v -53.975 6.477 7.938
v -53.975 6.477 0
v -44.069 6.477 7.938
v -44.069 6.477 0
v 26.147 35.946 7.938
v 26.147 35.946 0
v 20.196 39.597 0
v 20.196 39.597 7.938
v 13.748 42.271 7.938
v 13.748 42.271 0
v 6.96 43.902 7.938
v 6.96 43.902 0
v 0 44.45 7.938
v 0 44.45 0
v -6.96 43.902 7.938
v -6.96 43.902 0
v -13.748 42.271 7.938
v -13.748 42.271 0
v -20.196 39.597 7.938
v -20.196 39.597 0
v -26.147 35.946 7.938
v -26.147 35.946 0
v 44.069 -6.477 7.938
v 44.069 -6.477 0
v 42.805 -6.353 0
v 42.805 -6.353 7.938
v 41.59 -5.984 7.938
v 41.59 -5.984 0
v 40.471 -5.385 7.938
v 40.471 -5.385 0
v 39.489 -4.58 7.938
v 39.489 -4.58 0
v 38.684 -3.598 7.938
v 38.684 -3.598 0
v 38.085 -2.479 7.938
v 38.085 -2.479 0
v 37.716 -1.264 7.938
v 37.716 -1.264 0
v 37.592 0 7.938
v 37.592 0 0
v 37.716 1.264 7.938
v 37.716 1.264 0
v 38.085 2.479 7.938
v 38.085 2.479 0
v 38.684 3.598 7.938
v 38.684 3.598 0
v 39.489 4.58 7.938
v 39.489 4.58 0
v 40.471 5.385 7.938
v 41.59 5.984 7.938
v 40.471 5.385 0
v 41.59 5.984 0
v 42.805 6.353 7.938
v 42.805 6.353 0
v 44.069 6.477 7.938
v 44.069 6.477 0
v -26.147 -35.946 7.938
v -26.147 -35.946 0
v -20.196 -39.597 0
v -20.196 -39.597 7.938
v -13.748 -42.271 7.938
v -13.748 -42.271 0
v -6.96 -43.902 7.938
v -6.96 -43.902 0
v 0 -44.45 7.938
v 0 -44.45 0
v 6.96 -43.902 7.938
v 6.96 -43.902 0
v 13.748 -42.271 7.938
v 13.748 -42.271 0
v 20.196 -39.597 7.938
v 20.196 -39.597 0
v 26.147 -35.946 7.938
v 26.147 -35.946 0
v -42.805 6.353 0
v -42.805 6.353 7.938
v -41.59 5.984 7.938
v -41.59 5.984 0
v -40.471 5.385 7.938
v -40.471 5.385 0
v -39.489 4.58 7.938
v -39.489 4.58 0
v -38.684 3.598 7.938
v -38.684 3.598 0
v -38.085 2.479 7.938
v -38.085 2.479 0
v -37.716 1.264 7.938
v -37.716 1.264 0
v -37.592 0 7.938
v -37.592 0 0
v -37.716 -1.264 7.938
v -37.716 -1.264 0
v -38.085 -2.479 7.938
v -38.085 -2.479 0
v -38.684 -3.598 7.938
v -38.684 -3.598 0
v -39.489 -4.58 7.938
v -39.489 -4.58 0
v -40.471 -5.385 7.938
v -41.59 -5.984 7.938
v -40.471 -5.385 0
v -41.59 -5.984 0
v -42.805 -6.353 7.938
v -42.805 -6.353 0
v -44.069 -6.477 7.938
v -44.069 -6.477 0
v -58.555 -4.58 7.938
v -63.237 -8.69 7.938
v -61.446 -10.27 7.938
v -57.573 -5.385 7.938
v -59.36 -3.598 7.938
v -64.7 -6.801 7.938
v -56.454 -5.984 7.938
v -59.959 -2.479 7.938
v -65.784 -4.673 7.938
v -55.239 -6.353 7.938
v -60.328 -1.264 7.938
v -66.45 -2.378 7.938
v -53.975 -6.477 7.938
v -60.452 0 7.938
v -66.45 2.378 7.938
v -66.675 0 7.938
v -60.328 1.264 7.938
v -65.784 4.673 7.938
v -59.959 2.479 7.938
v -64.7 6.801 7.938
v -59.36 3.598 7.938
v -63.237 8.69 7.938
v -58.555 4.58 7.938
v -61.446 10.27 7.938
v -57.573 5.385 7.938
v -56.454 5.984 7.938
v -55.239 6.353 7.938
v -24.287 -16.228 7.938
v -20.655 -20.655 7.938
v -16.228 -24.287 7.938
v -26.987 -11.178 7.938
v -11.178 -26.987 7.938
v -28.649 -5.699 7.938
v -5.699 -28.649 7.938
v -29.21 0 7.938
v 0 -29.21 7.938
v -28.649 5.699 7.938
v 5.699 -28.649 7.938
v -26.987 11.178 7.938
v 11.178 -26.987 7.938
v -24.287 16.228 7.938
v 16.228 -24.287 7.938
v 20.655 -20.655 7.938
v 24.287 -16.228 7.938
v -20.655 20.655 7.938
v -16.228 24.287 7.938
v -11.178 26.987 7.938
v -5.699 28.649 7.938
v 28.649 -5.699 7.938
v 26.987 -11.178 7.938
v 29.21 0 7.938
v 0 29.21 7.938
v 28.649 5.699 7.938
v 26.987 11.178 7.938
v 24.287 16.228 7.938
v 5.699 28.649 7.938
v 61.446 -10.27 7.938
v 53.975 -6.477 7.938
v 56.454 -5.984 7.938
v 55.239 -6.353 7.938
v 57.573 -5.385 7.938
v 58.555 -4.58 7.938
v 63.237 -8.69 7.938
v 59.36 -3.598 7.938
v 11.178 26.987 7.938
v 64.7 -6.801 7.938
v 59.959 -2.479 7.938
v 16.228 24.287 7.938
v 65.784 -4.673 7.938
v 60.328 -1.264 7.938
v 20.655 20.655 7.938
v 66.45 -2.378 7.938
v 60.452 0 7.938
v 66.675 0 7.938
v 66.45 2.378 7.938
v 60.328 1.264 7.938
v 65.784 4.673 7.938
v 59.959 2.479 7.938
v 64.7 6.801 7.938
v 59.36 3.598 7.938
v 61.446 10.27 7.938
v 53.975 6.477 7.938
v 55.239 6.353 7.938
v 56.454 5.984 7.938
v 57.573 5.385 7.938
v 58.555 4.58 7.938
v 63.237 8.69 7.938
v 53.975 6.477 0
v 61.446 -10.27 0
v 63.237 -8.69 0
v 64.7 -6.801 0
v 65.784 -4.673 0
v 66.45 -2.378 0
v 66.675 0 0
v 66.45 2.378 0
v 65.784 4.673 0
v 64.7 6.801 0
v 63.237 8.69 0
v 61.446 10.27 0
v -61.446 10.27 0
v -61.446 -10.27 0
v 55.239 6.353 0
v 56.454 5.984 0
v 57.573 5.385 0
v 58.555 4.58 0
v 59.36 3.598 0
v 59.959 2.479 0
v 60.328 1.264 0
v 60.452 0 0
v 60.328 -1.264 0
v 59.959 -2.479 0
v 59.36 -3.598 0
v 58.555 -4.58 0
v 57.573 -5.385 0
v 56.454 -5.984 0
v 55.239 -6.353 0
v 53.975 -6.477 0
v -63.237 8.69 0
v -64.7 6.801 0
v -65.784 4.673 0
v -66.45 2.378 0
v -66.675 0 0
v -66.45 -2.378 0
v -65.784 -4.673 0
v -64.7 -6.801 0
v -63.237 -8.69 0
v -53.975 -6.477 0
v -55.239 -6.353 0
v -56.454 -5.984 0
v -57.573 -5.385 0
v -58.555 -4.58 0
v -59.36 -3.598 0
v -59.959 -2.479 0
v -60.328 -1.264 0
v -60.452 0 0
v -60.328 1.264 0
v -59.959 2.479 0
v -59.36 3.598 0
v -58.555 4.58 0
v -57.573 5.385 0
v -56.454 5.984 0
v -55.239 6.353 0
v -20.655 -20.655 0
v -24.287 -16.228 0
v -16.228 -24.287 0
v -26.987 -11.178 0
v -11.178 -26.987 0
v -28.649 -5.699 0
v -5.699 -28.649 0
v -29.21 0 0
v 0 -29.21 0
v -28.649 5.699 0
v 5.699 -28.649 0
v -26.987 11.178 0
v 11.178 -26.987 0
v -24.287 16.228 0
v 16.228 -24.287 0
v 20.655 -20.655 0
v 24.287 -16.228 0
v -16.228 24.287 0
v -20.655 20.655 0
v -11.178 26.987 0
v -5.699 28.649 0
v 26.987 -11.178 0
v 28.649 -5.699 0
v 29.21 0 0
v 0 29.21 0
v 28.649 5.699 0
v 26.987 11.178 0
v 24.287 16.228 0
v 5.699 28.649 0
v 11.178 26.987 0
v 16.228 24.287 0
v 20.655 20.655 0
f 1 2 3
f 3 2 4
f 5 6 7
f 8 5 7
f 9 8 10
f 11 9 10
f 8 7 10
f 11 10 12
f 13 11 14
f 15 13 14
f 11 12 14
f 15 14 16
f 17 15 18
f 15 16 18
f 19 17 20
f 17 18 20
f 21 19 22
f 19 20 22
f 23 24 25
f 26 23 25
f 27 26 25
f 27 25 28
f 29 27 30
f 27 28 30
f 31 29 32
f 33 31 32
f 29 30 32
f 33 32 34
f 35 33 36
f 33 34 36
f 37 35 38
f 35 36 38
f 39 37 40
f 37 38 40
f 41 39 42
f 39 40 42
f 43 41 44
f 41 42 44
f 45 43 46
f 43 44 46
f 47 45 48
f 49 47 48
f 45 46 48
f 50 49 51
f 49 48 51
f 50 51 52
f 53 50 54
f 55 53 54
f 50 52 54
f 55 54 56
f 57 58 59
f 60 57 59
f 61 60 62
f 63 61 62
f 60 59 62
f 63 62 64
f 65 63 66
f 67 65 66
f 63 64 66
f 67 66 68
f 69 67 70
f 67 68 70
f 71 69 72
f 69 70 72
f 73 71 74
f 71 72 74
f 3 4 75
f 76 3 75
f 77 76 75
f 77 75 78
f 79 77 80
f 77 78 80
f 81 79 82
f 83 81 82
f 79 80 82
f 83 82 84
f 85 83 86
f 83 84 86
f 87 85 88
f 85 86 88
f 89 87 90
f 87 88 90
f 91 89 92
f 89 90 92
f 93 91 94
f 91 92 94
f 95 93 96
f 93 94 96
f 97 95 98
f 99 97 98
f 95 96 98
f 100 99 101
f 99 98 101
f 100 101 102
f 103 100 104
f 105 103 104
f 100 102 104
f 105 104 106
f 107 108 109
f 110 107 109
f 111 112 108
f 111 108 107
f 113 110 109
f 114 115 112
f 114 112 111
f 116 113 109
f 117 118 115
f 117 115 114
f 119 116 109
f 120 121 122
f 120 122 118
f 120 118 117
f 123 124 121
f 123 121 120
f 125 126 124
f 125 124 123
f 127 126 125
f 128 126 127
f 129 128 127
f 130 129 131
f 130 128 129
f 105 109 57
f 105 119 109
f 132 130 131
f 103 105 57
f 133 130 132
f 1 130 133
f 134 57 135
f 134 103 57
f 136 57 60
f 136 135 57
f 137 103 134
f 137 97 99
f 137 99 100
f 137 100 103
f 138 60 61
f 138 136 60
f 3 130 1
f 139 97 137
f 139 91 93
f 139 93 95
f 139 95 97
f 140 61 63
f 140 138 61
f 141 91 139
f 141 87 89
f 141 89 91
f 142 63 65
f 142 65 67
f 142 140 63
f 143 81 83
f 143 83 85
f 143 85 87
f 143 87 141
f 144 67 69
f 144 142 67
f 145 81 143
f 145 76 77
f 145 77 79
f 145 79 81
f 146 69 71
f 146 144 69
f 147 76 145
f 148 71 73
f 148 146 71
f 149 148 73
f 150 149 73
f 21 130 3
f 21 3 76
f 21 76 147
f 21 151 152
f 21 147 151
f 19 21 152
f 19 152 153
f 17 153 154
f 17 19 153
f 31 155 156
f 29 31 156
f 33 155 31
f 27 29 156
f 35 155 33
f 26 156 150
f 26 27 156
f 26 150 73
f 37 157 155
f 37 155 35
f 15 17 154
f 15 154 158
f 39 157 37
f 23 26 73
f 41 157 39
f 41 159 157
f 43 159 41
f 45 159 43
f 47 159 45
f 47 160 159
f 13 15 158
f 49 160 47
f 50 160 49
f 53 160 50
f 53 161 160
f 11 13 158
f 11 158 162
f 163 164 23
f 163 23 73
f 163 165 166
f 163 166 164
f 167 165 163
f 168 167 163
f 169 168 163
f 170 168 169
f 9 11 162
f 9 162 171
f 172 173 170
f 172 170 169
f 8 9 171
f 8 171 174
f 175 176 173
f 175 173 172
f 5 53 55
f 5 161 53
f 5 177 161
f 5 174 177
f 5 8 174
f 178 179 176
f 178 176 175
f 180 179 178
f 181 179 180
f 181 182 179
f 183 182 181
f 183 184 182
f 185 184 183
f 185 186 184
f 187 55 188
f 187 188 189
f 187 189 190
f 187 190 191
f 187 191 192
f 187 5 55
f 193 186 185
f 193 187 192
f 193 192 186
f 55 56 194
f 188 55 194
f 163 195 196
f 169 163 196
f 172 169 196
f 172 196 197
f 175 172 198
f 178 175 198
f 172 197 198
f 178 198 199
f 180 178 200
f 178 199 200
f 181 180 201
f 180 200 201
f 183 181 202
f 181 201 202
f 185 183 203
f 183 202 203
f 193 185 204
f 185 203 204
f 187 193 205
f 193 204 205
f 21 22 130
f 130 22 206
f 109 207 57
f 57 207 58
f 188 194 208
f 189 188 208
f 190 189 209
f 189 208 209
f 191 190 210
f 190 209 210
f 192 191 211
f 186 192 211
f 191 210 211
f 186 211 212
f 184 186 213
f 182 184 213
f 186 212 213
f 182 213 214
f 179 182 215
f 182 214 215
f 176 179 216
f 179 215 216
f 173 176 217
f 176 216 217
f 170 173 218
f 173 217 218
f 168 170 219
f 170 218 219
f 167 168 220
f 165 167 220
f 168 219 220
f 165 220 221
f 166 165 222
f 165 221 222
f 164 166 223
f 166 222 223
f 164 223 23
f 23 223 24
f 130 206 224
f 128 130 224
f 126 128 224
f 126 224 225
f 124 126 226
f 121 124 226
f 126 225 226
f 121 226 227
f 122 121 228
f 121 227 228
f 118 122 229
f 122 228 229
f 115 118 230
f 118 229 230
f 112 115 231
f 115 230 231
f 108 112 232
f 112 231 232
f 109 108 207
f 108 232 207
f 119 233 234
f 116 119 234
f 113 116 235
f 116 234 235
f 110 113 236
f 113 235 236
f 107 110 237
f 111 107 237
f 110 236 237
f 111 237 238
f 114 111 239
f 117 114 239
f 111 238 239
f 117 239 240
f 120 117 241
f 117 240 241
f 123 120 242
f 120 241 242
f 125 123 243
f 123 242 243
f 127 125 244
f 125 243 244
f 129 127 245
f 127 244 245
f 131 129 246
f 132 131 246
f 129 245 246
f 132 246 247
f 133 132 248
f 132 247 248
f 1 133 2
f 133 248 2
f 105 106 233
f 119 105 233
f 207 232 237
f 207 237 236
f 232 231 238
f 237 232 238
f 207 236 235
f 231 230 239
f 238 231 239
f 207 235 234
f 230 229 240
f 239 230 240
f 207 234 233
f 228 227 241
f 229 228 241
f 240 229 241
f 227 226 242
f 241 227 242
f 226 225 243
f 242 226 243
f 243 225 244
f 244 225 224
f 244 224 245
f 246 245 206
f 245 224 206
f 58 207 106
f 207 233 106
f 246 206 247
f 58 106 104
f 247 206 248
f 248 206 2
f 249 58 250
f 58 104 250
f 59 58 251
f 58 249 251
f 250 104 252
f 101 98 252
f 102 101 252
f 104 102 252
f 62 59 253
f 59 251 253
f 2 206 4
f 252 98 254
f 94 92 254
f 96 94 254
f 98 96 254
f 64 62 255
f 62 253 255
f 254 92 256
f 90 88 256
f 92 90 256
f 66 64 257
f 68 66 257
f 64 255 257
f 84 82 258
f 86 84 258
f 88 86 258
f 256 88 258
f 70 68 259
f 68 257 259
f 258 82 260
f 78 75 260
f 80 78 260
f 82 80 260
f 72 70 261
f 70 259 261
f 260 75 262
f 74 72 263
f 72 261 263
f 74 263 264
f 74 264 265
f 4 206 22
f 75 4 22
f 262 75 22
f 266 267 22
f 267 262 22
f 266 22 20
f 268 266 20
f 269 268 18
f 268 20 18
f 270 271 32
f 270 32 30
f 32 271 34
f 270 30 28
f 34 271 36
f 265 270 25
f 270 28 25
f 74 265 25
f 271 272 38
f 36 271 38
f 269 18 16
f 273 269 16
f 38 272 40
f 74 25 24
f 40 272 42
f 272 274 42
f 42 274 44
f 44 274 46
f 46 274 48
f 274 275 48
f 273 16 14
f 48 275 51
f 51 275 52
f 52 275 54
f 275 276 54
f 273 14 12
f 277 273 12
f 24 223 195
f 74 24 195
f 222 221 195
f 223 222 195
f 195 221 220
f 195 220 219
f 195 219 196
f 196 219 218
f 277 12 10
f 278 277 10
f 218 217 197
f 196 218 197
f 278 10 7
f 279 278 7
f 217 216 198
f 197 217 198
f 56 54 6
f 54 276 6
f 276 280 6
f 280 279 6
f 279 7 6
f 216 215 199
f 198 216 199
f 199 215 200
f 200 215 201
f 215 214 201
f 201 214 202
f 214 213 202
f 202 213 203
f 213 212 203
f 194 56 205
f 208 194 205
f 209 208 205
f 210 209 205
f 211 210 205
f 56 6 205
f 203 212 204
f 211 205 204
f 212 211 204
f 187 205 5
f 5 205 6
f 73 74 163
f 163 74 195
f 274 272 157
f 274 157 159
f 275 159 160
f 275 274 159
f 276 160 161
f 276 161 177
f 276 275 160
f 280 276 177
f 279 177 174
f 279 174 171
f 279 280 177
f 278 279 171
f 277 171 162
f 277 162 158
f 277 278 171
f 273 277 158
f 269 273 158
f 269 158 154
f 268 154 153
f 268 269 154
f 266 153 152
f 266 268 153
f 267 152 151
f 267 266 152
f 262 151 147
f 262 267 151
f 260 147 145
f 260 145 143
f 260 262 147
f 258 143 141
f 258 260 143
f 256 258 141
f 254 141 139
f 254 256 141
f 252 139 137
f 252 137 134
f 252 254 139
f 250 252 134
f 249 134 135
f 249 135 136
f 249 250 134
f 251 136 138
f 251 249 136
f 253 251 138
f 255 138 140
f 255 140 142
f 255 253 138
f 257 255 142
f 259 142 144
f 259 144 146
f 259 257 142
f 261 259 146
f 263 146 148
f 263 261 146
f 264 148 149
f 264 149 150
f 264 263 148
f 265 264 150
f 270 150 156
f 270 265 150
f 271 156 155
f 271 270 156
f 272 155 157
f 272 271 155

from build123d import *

# Parameters (mm, degrees)
F0_R     = 29.21
F1_DEPTH = 7.9375


# Not quite as in the source:
# - a length typed as a fraction of an inch, garbled in the dataset ("3 / 203.2 mm" for 3/8 in), is restored


with BuildPart() as f1:
    # F0 (on Top) → F1 (new body)
    with BuildSketch(Plane.XY):
        with BuildLine():
            Line((-61.4455882353, -10.2703608222), (-26.1470588235, -35.9462628778))
            ThreePointArc((-26.1470588235, -35.9462628778), (0, -44.45), (26.1470588235, -35.9462628778))
            Line((26.1470588235, -35.9462628778), (61.4455882353, -10.2703608222))
            ThreePointArc((61.4455882353, -10.2703608222), (66.675, 0), (61.4455882353, 10.2703608222))
            Line((61.4455882353, 10.2703608222), (26.1470588235, 35.9462628778))
            ThreePointArc((26.1470588235, 35.9462628778), (0, 44.45), (-26.1470588235, 35.9462628778))
            Line((-26.1470588235, 35.9462628778), (-61.4455882353, 10.2703608222))
            ThreePointArc((-61.4455882353, 10.2703608222), (-66.675, 0), (-61.4455882353, -10.2703608222))
        make_face()
        with BuildLine():
            ThreePointArc((-44.069, 6.477), (-37.592, 0), (-44.069, -6.477))
            Line((-44.069, -6.477), (-53.975, -6.477))
            ThreePointArc((-53.975, -6.477), (-60.452, 0), (-53.975, 6.477))
            Line((-53.975, 6.477), (-44.069, 6.477))
        make_face(mode=Mode.SUBTRACT)
        Circle(F0_R, mode=Mode.SUBTRACT)
        with BuildLine():
            ThreePointArc((44.069, -6.477), (37.592, 0), (44.069, 6.477))
            Line((44.069, 6.477), (53.975, 6.477))
            ThreePointArc((53.975, 6.477), (60.452, 0), (53.975, -6.477))
            Line((53.975, -6.477), (44.069, -6.477))
        make_face(mode=Mode.SUBTRACT)
    extrude(amount=F1_DEPTH)


solid = f1.part
